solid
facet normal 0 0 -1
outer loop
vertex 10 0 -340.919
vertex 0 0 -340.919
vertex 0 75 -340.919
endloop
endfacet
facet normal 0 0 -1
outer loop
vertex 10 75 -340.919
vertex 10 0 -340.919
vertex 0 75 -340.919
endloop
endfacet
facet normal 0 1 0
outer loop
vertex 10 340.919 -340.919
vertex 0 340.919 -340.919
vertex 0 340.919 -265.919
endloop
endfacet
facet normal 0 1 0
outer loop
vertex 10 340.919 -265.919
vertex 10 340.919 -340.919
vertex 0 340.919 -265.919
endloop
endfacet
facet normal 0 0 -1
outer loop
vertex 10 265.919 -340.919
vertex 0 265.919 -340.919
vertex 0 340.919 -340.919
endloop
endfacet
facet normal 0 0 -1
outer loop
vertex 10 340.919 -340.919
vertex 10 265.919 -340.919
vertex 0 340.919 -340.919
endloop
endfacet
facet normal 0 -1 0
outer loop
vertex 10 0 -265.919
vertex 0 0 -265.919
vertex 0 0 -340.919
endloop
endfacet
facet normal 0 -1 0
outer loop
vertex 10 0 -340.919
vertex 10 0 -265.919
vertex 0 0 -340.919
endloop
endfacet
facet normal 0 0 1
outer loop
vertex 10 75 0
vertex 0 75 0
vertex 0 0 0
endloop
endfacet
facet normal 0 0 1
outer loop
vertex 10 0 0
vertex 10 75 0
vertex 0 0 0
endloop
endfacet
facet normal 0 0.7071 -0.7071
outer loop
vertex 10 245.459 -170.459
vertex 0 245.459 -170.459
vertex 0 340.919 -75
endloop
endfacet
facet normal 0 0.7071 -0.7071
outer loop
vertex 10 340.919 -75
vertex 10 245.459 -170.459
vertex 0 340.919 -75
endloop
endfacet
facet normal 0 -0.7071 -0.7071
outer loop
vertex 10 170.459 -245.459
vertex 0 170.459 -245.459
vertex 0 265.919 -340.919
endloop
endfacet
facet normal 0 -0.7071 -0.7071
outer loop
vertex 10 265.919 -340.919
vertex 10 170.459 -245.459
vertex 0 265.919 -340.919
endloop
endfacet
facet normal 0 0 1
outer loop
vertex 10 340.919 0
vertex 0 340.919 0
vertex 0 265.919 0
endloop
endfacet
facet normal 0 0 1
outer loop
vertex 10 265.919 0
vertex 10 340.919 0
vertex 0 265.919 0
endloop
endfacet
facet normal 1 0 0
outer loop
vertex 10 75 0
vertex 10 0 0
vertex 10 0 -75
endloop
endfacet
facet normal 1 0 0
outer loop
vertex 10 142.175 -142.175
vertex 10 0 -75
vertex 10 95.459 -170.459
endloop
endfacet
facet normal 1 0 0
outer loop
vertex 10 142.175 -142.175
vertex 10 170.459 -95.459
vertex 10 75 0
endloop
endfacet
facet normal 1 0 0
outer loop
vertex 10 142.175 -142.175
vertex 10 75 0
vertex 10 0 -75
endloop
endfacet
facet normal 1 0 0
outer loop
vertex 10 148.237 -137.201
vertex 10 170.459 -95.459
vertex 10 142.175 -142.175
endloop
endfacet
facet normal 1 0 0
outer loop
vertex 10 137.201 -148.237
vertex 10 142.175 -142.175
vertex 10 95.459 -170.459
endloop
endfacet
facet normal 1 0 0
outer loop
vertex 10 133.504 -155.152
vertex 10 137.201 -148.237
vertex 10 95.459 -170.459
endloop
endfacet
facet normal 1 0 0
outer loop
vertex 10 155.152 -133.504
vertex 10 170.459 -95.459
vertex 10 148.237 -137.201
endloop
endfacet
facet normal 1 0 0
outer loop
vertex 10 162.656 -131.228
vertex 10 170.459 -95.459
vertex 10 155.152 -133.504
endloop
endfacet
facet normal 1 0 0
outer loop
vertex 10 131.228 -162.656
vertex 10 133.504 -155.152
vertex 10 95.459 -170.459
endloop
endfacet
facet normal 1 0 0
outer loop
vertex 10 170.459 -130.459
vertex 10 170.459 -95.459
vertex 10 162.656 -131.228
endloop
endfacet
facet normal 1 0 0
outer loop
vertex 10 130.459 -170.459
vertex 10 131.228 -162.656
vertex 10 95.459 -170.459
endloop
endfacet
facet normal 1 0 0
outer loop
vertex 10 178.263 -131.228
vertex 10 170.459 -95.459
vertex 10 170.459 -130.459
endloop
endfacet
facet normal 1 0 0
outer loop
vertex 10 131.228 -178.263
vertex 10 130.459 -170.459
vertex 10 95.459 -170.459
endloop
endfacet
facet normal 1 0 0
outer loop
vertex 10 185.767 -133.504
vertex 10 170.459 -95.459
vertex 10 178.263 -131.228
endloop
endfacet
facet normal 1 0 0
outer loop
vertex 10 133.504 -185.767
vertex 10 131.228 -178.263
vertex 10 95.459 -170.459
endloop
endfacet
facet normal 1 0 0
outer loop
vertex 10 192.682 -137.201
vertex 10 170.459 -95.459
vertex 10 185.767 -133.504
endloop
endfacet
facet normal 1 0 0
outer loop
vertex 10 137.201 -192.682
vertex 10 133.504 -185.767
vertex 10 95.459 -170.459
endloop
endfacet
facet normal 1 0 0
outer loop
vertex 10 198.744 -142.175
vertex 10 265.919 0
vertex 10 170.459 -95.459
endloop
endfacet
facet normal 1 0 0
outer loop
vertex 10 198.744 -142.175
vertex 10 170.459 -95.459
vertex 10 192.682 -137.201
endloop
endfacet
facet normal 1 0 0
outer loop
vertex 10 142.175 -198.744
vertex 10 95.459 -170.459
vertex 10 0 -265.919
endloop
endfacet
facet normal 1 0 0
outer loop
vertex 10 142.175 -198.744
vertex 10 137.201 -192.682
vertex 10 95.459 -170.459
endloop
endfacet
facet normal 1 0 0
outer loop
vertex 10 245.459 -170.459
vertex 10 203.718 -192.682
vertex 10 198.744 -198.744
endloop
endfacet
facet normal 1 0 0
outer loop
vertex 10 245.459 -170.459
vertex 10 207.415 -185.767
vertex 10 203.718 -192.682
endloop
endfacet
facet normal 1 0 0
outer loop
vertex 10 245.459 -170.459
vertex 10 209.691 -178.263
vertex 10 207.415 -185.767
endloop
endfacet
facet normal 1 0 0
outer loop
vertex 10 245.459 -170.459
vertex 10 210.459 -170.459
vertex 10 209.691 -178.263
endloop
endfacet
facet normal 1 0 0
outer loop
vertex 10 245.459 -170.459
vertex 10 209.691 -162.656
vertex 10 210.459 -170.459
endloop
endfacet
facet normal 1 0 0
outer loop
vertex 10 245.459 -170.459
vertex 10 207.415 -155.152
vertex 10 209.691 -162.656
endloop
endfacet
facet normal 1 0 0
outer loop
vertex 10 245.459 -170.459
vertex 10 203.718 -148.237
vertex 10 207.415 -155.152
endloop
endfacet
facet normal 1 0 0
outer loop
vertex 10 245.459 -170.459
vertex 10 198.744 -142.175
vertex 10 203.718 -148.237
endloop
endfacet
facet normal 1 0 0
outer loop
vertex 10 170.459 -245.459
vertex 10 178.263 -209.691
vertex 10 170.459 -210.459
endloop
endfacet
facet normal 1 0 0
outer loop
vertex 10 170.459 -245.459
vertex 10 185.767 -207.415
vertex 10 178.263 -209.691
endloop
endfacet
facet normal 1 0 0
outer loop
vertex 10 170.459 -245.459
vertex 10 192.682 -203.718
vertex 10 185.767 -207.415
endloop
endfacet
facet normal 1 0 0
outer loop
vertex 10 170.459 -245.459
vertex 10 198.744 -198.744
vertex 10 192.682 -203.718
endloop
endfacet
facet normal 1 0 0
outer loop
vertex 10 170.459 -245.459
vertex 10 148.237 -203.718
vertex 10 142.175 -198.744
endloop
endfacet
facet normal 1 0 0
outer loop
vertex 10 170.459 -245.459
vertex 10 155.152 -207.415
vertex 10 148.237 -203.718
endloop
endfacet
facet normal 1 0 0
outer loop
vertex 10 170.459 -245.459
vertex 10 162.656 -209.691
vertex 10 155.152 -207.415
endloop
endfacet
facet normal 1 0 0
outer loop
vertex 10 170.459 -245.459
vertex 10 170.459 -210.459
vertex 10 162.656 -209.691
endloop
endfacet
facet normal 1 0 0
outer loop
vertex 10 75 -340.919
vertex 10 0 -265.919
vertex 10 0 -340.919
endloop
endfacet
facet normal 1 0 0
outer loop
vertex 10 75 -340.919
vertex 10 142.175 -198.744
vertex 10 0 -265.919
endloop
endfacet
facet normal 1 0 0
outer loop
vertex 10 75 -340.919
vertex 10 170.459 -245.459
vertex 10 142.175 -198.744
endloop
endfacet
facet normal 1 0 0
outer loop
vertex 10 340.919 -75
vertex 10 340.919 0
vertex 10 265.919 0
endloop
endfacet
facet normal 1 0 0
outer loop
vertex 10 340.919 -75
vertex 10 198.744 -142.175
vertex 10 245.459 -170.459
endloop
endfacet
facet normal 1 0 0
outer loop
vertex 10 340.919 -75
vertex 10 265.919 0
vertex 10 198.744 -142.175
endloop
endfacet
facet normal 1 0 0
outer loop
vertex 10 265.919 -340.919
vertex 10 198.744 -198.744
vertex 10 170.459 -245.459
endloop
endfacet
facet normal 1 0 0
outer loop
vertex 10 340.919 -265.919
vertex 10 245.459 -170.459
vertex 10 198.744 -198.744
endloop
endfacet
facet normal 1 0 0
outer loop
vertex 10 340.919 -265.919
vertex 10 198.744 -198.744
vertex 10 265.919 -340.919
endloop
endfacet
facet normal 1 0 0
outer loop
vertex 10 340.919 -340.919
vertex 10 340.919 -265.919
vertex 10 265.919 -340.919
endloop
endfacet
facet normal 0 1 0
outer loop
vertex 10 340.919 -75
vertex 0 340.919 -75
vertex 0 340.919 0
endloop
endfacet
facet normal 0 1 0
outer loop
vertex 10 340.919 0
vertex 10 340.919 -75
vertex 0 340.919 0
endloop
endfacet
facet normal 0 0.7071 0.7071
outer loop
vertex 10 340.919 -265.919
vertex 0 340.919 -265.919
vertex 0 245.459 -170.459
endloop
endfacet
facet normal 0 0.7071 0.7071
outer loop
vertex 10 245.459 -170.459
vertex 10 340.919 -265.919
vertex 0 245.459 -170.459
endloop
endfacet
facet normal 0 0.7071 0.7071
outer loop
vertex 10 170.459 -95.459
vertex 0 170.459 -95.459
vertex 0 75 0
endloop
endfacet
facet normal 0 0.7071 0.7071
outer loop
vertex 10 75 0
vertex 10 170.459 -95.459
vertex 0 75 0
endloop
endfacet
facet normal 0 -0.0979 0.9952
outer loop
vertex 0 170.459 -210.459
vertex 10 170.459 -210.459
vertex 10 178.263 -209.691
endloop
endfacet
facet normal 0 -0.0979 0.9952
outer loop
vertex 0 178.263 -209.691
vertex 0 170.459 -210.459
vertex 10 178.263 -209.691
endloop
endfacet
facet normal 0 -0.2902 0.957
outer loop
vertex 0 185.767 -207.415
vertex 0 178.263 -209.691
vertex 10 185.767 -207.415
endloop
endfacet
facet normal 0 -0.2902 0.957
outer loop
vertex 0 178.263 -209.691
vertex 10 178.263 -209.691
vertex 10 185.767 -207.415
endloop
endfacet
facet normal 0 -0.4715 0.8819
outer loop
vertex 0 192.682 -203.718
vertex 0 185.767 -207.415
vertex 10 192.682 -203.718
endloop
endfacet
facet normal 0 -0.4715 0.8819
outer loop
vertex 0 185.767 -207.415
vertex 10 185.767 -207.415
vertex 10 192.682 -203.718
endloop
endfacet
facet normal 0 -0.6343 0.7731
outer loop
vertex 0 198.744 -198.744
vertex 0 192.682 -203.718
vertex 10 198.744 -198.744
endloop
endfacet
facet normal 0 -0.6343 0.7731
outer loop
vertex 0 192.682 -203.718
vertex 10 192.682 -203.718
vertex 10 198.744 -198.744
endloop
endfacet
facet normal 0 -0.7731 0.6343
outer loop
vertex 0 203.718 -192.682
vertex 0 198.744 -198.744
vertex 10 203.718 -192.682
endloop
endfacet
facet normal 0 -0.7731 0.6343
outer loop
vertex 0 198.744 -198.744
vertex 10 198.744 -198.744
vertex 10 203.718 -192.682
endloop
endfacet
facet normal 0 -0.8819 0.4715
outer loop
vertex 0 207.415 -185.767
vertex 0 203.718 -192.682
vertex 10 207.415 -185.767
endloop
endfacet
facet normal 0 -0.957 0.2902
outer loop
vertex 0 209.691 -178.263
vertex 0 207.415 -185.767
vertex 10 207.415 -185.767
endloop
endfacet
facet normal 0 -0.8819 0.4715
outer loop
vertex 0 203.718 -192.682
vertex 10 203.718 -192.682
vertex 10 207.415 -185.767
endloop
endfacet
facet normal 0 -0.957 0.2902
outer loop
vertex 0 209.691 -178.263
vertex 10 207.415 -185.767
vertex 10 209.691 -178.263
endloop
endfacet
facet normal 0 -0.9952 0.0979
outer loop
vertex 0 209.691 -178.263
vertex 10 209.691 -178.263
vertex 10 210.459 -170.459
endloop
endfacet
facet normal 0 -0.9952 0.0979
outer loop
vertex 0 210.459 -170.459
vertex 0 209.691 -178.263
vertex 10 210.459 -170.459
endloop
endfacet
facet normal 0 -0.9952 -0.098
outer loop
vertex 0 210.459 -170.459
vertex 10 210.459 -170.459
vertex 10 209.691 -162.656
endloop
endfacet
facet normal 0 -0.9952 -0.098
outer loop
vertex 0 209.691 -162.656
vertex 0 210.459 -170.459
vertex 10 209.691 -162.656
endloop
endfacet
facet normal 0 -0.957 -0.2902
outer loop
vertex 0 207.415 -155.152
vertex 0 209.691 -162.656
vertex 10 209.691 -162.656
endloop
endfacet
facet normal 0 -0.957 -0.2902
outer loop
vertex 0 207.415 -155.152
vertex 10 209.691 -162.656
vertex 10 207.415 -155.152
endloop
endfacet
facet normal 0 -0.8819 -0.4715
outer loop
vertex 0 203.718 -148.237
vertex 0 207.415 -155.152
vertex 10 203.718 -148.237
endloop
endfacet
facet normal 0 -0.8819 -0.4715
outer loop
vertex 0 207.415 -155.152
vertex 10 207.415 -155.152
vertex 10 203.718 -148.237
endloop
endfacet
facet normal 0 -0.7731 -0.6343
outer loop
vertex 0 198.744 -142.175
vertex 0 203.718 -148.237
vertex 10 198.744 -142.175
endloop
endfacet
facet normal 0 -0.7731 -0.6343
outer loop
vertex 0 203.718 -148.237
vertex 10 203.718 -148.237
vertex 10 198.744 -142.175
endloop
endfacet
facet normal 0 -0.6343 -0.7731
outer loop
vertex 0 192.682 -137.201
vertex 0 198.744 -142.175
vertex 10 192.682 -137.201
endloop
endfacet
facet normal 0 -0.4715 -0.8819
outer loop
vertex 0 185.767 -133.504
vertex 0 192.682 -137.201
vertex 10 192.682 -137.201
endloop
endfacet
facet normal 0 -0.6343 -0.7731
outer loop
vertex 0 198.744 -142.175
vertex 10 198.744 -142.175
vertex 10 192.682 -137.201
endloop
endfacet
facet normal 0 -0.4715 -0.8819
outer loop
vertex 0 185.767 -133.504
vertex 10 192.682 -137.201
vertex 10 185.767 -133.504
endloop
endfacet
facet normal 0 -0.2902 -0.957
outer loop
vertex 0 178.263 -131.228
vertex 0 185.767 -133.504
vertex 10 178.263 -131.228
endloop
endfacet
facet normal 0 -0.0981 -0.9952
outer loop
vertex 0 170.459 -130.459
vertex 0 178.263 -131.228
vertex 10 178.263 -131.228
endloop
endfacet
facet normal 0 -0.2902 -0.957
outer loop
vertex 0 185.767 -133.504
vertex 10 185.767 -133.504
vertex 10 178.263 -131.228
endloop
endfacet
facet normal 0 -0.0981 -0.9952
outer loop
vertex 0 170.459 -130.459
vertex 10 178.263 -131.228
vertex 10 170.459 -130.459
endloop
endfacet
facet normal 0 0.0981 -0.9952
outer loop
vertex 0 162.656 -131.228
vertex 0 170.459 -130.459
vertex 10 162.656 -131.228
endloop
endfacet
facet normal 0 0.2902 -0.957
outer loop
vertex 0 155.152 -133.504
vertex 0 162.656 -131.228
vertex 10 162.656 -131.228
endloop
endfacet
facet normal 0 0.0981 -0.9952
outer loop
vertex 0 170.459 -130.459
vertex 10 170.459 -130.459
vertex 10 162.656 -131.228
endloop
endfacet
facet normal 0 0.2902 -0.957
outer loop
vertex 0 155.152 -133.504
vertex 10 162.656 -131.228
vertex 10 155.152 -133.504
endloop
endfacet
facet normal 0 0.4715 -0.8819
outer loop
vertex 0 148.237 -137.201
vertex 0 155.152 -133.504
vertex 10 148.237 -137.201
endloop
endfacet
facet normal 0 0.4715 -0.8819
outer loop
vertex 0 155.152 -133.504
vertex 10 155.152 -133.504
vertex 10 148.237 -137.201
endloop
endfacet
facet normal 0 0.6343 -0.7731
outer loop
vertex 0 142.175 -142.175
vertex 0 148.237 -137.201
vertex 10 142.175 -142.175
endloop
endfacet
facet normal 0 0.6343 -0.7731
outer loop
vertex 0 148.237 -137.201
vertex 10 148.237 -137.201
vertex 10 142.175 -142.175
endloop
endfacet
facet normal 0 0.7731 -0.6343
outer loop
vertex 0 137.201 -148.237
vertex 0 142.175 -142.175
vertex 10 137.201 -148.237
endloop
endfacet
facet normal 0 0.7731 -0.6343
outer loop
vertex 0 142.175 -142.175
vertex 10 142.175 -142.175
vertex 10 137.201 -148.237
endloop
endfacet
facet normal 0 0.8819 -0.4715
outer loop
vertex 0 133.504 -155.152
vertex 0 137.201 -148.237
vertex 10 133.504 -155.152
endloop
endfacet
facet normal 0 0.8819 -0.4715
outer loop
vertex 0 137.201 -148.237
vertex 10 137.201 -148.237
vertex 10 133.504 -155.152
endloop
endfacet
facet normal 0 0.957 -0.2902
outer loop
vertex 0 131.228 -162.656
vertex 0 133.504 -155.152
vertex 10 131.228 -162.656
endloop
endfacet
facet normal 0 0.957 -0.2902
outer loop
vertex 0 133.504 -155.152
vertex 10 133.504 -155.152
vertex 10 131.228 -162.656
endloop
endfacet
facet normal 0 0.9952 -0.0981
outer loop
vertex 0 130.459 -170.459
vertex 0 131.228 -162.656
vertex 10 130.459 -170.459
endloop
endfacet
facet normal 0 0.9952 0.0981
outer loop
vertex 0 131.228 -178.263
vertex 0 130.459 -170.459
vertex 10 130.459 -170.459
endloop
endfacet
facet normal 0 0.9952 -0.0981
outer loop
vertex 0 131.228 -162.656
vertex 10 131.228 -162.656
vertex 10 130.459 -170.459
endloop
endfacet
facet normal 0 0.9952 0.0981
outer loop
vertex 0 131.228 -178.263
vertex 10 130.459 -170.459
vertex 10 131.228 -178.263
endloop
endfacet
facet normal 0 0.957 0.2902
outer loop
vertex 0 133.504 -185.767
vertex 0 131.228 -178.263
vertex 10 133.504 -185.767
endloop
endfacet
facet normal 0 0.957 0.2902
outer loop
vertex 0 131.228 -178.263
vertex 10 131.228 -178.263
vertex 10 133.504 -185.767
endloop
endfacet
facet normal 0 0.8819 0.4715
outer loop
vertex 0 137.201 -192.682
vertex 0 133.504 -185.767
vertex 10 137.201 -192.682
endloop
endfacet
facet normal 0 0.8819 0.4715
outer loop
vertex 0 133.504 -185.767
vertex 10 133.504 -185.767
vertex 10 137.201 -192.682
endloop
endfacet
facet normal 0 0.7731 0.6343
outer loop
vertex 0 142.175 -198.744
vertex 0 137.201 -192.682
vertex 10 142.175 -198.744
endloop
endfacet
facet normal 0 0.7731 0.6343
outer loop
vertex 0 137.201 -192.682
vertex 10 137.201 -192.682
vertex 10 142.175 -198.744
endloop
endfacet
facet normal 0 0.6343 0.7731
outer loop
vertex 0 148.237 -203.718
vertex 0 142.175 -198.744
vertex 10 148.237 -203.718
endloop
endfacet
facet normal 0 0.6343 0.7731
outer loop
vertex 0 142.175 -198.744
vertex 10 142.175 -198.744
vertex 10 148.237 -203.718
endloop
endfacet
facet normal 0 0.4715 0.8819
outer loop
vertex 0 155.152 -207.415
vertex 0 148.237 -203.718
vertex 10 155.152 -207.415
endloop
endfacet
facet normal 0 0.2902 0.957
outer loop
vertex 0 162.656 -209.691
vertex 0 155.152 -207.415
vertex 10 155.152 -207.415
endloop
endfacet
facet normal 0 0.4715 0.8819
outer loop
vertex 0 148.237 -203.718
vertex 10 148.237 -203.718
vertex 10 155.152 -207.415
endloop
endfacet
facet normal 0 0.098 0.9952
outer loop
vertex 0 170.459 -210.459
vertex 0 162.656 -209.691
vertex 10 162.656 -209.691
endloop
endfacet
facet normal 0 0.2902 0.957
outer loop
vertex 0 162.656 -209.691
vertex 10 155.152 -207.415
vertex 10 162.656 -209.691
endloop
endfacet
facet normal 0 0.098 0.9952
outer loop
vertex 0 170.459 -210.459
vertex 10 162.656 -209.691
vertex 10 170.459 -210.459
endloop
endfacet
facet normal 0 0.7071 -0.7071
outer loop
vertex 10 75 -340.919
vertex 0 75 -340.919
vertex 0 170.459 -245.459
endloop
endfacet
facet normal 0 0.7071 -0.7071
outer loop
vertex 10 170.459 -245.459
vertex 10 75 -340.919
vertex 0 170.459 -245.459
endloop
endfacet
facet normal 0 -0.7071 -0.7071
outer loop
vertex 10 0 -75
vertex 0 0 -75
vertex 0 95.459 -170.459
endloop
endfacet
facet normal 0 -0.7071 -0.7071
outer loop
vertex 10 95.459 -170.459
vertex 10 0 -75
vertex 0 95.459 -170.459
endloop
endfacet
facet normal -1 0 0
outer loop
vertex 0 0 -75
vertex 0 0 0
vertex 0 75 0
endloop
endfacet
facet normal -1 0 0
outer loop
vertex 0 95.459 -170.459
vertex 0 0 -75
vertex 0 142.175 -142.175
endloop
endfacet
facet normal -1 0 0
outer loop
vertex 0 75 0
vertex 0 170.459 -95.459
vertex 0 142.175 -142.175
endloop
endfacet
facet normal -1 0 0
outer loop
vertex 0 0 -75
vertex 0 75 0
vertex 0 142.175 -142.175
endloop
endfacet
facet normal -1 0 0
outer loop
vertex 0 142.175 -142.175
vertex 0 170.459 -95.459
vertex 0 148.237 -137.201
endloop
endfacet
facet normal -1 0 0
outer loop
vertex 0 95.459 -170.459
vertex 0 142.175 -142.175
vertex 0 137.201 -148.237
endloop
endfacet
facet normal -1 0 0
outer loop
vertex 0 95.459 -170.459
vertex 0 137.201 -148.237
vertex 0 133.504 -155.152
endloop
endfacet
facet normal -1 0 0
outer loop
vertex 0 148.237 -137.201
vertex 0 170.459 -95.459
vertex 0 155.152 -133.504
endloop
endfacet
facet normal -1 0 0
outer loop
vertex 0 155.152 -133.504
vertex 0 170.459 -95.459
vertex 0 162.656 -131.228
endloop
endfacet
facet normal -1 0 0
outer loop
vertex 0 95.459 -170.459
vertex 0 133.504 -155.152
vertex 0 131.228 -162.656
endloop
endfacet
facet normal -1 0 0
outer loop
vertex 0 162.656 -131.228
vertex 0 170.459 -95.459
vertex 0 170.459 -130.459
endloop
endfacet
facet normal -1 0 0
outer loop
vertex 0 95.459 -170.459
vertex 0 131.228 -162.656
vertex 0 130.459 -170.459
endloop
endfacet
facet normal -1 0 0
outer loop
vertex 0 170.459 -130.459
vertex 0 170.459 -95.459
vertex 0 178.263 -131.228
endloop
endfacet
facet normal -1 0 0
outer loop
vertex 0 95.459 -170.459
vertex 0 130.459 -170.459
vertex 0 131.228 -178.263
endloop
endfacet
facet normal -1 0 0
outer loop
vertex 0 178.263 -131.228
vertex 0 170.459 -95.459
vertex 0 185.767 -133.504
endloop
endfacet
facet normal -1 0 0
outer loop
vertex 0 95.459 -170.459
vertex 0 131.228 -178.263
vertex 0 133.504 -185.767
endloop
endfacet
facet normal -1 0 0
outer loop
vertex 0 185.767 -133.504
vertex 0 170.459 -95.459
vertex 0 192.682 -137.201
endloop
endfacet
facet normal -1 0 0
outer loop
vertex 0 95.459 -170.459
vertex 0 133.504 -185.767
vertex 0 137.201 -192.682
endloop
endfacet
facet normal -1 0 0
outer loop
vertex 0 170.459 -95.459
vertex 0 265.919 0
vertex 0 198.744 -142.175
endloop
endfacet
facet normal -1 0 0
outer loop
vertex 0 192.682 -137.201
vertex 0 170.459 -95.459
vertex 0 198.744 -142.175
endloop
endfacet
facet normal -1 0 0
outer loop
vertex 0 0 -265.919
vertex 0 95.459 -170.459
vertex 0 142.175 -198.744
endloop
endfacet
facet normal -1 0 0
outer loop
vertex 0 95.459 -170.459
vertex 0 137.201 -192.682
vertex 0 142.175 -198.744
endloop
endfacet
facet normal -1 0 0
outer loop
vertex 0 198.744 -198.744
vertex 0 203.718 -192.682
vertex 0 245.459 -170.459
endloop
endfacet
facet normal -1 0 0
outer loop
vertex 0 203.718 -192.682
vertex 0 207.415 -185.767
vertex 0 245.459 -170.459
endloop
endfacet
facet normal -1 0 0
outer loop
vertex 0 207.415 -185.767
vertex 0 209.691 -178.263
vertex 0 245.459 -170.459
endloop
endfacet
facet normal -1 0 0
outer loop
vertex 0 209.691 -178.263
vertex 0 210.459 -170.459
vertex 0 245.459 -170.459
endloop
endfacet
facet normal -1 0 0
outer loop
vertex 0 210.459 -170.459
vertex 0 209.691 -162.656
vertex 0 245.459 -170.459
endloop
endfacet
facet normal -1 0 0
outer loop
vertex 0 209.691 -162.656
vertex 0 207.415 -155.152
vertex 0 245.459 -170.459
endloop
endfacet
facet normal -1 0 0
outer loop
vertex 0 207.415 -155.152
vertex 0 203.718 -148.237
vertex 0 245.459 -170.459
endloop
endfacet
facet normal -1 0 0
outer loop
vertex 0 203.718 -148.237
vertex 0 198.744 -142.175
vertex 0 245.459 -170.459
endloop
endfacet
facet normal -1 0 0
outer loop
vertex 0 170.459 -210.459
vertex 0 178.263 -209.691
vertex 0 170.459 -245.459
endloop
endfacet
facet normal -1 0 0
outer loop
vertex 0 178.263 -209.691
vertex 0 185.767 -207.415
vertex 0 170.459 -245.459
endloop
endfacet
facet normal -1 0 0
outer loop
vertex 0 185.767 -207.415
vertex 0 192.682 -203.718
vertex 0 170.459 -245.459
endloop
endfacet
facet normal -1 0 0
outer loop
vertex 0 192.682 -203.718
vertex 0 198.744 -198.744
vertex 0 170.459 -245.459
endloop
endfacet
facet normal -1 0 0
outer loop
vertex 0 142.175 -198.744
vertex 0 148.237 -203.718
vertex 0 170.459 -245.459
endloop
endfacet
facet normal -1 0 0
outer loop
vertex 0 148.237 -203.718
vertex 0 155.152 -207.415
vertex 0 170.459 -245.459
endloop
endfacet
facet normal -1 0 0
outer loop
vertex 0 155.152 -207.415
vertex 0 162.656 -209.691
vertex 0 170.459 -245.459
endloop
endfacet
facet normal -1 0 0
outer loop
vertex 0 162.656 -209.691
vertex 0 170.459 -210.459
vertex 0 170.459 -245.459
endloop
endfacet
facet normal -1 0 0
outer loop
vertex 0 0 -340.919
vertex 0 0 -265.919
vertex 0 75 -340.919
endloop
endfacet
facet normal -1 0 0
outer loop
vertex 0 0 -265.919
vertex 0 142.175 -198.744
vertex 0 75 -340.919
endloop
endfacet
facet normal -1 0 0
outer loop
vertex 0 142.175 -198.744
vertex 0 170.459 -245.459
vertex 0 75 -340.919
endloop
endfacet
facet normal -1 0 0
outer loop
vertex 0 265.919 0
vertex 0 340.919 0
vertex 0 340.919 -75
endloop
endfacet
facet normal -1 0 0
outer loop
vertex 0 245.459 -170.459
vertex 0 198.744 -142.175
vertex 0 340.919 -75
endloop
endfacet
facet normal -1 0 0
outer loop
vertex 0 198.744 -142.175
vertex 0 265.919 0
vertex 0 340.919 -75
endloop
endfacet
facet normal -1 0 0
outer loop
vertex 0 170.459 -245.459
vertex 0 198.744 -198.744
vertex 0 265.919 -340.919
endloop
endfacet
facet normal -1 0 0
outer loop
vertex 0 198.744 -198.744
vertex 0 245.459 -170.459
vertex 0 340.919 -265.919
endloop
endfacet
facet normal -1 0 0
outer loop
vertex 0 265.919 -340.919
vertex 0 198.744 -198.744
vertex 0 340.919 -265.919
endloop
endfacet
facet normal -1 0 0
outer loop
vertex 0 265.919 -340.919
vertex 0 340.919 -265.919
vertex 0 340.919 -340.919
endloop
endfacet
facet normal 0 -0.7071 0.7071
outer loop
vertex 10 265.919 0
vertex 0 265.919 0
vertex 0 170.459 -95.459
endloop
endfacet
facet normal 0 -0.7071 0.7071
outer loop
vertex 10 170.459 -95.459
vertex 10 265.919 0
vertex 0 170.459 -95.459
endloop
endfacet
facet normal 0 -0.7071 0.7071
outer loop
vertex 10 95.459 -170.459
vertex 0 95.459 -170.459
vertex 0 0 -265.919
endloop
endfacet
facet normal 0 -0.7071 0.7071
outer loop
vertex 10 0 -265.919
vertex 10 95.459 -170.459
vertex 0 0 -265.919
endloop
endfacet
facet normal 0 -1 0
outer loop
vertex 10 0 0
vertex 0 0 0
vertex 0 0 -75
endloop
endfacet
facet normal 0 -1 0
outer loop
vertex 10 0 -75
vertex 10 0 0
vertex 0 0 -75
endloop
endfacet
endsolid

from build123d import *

# Parameters (mm, degrees)
BOSS_EXTRUDE2_DEPTH = 10
SKETCH3_R           = 40
CUT_EXTRUDE1_DEPTH  = 10


with BuildPart() as part:
    # Sketch1 → Boss-Extrude2 (new body)
    with BuildSketch(Plane(origin=(0, 0, 0), x_dir=(0, 0, -1), z_dir=(1, 0, 0))):
        Polygon((0, 0), (75, 0), (170.45941546, 95.45941546), (265.91883092, 0), (340.91883092, 0), (340.91883092, 75), (245.45941546, 170.45941546), (340.91883092, 265.91883092), (340.91883092, 340.91883092), (265.91883092, 340.91883092), (170.45941546, 245.45941546), (75, 340.91883092), (0, 340.91883092), (0, 265.91883092), (95.45941546, 170.45941546), (0, 75), align=None)
    extrude(amount=BOSS_EXTRUDE2_DEPTH)

    # Sketch3 → Cut-Extrude1 (cut)
    with BuildSketch(Plane(origin=(10, 0, 0), x_dir=(0, 0, -1), z_dir=(1, 0, 0))):
        with Locations((170.45941546, 170.45941546)):
            Circle(SKETCH3_R)
    extrude(amount=-CUT_EXTRUDE1_DEPTH, mode=Mode.SUBTRACT)


solid = part.part
